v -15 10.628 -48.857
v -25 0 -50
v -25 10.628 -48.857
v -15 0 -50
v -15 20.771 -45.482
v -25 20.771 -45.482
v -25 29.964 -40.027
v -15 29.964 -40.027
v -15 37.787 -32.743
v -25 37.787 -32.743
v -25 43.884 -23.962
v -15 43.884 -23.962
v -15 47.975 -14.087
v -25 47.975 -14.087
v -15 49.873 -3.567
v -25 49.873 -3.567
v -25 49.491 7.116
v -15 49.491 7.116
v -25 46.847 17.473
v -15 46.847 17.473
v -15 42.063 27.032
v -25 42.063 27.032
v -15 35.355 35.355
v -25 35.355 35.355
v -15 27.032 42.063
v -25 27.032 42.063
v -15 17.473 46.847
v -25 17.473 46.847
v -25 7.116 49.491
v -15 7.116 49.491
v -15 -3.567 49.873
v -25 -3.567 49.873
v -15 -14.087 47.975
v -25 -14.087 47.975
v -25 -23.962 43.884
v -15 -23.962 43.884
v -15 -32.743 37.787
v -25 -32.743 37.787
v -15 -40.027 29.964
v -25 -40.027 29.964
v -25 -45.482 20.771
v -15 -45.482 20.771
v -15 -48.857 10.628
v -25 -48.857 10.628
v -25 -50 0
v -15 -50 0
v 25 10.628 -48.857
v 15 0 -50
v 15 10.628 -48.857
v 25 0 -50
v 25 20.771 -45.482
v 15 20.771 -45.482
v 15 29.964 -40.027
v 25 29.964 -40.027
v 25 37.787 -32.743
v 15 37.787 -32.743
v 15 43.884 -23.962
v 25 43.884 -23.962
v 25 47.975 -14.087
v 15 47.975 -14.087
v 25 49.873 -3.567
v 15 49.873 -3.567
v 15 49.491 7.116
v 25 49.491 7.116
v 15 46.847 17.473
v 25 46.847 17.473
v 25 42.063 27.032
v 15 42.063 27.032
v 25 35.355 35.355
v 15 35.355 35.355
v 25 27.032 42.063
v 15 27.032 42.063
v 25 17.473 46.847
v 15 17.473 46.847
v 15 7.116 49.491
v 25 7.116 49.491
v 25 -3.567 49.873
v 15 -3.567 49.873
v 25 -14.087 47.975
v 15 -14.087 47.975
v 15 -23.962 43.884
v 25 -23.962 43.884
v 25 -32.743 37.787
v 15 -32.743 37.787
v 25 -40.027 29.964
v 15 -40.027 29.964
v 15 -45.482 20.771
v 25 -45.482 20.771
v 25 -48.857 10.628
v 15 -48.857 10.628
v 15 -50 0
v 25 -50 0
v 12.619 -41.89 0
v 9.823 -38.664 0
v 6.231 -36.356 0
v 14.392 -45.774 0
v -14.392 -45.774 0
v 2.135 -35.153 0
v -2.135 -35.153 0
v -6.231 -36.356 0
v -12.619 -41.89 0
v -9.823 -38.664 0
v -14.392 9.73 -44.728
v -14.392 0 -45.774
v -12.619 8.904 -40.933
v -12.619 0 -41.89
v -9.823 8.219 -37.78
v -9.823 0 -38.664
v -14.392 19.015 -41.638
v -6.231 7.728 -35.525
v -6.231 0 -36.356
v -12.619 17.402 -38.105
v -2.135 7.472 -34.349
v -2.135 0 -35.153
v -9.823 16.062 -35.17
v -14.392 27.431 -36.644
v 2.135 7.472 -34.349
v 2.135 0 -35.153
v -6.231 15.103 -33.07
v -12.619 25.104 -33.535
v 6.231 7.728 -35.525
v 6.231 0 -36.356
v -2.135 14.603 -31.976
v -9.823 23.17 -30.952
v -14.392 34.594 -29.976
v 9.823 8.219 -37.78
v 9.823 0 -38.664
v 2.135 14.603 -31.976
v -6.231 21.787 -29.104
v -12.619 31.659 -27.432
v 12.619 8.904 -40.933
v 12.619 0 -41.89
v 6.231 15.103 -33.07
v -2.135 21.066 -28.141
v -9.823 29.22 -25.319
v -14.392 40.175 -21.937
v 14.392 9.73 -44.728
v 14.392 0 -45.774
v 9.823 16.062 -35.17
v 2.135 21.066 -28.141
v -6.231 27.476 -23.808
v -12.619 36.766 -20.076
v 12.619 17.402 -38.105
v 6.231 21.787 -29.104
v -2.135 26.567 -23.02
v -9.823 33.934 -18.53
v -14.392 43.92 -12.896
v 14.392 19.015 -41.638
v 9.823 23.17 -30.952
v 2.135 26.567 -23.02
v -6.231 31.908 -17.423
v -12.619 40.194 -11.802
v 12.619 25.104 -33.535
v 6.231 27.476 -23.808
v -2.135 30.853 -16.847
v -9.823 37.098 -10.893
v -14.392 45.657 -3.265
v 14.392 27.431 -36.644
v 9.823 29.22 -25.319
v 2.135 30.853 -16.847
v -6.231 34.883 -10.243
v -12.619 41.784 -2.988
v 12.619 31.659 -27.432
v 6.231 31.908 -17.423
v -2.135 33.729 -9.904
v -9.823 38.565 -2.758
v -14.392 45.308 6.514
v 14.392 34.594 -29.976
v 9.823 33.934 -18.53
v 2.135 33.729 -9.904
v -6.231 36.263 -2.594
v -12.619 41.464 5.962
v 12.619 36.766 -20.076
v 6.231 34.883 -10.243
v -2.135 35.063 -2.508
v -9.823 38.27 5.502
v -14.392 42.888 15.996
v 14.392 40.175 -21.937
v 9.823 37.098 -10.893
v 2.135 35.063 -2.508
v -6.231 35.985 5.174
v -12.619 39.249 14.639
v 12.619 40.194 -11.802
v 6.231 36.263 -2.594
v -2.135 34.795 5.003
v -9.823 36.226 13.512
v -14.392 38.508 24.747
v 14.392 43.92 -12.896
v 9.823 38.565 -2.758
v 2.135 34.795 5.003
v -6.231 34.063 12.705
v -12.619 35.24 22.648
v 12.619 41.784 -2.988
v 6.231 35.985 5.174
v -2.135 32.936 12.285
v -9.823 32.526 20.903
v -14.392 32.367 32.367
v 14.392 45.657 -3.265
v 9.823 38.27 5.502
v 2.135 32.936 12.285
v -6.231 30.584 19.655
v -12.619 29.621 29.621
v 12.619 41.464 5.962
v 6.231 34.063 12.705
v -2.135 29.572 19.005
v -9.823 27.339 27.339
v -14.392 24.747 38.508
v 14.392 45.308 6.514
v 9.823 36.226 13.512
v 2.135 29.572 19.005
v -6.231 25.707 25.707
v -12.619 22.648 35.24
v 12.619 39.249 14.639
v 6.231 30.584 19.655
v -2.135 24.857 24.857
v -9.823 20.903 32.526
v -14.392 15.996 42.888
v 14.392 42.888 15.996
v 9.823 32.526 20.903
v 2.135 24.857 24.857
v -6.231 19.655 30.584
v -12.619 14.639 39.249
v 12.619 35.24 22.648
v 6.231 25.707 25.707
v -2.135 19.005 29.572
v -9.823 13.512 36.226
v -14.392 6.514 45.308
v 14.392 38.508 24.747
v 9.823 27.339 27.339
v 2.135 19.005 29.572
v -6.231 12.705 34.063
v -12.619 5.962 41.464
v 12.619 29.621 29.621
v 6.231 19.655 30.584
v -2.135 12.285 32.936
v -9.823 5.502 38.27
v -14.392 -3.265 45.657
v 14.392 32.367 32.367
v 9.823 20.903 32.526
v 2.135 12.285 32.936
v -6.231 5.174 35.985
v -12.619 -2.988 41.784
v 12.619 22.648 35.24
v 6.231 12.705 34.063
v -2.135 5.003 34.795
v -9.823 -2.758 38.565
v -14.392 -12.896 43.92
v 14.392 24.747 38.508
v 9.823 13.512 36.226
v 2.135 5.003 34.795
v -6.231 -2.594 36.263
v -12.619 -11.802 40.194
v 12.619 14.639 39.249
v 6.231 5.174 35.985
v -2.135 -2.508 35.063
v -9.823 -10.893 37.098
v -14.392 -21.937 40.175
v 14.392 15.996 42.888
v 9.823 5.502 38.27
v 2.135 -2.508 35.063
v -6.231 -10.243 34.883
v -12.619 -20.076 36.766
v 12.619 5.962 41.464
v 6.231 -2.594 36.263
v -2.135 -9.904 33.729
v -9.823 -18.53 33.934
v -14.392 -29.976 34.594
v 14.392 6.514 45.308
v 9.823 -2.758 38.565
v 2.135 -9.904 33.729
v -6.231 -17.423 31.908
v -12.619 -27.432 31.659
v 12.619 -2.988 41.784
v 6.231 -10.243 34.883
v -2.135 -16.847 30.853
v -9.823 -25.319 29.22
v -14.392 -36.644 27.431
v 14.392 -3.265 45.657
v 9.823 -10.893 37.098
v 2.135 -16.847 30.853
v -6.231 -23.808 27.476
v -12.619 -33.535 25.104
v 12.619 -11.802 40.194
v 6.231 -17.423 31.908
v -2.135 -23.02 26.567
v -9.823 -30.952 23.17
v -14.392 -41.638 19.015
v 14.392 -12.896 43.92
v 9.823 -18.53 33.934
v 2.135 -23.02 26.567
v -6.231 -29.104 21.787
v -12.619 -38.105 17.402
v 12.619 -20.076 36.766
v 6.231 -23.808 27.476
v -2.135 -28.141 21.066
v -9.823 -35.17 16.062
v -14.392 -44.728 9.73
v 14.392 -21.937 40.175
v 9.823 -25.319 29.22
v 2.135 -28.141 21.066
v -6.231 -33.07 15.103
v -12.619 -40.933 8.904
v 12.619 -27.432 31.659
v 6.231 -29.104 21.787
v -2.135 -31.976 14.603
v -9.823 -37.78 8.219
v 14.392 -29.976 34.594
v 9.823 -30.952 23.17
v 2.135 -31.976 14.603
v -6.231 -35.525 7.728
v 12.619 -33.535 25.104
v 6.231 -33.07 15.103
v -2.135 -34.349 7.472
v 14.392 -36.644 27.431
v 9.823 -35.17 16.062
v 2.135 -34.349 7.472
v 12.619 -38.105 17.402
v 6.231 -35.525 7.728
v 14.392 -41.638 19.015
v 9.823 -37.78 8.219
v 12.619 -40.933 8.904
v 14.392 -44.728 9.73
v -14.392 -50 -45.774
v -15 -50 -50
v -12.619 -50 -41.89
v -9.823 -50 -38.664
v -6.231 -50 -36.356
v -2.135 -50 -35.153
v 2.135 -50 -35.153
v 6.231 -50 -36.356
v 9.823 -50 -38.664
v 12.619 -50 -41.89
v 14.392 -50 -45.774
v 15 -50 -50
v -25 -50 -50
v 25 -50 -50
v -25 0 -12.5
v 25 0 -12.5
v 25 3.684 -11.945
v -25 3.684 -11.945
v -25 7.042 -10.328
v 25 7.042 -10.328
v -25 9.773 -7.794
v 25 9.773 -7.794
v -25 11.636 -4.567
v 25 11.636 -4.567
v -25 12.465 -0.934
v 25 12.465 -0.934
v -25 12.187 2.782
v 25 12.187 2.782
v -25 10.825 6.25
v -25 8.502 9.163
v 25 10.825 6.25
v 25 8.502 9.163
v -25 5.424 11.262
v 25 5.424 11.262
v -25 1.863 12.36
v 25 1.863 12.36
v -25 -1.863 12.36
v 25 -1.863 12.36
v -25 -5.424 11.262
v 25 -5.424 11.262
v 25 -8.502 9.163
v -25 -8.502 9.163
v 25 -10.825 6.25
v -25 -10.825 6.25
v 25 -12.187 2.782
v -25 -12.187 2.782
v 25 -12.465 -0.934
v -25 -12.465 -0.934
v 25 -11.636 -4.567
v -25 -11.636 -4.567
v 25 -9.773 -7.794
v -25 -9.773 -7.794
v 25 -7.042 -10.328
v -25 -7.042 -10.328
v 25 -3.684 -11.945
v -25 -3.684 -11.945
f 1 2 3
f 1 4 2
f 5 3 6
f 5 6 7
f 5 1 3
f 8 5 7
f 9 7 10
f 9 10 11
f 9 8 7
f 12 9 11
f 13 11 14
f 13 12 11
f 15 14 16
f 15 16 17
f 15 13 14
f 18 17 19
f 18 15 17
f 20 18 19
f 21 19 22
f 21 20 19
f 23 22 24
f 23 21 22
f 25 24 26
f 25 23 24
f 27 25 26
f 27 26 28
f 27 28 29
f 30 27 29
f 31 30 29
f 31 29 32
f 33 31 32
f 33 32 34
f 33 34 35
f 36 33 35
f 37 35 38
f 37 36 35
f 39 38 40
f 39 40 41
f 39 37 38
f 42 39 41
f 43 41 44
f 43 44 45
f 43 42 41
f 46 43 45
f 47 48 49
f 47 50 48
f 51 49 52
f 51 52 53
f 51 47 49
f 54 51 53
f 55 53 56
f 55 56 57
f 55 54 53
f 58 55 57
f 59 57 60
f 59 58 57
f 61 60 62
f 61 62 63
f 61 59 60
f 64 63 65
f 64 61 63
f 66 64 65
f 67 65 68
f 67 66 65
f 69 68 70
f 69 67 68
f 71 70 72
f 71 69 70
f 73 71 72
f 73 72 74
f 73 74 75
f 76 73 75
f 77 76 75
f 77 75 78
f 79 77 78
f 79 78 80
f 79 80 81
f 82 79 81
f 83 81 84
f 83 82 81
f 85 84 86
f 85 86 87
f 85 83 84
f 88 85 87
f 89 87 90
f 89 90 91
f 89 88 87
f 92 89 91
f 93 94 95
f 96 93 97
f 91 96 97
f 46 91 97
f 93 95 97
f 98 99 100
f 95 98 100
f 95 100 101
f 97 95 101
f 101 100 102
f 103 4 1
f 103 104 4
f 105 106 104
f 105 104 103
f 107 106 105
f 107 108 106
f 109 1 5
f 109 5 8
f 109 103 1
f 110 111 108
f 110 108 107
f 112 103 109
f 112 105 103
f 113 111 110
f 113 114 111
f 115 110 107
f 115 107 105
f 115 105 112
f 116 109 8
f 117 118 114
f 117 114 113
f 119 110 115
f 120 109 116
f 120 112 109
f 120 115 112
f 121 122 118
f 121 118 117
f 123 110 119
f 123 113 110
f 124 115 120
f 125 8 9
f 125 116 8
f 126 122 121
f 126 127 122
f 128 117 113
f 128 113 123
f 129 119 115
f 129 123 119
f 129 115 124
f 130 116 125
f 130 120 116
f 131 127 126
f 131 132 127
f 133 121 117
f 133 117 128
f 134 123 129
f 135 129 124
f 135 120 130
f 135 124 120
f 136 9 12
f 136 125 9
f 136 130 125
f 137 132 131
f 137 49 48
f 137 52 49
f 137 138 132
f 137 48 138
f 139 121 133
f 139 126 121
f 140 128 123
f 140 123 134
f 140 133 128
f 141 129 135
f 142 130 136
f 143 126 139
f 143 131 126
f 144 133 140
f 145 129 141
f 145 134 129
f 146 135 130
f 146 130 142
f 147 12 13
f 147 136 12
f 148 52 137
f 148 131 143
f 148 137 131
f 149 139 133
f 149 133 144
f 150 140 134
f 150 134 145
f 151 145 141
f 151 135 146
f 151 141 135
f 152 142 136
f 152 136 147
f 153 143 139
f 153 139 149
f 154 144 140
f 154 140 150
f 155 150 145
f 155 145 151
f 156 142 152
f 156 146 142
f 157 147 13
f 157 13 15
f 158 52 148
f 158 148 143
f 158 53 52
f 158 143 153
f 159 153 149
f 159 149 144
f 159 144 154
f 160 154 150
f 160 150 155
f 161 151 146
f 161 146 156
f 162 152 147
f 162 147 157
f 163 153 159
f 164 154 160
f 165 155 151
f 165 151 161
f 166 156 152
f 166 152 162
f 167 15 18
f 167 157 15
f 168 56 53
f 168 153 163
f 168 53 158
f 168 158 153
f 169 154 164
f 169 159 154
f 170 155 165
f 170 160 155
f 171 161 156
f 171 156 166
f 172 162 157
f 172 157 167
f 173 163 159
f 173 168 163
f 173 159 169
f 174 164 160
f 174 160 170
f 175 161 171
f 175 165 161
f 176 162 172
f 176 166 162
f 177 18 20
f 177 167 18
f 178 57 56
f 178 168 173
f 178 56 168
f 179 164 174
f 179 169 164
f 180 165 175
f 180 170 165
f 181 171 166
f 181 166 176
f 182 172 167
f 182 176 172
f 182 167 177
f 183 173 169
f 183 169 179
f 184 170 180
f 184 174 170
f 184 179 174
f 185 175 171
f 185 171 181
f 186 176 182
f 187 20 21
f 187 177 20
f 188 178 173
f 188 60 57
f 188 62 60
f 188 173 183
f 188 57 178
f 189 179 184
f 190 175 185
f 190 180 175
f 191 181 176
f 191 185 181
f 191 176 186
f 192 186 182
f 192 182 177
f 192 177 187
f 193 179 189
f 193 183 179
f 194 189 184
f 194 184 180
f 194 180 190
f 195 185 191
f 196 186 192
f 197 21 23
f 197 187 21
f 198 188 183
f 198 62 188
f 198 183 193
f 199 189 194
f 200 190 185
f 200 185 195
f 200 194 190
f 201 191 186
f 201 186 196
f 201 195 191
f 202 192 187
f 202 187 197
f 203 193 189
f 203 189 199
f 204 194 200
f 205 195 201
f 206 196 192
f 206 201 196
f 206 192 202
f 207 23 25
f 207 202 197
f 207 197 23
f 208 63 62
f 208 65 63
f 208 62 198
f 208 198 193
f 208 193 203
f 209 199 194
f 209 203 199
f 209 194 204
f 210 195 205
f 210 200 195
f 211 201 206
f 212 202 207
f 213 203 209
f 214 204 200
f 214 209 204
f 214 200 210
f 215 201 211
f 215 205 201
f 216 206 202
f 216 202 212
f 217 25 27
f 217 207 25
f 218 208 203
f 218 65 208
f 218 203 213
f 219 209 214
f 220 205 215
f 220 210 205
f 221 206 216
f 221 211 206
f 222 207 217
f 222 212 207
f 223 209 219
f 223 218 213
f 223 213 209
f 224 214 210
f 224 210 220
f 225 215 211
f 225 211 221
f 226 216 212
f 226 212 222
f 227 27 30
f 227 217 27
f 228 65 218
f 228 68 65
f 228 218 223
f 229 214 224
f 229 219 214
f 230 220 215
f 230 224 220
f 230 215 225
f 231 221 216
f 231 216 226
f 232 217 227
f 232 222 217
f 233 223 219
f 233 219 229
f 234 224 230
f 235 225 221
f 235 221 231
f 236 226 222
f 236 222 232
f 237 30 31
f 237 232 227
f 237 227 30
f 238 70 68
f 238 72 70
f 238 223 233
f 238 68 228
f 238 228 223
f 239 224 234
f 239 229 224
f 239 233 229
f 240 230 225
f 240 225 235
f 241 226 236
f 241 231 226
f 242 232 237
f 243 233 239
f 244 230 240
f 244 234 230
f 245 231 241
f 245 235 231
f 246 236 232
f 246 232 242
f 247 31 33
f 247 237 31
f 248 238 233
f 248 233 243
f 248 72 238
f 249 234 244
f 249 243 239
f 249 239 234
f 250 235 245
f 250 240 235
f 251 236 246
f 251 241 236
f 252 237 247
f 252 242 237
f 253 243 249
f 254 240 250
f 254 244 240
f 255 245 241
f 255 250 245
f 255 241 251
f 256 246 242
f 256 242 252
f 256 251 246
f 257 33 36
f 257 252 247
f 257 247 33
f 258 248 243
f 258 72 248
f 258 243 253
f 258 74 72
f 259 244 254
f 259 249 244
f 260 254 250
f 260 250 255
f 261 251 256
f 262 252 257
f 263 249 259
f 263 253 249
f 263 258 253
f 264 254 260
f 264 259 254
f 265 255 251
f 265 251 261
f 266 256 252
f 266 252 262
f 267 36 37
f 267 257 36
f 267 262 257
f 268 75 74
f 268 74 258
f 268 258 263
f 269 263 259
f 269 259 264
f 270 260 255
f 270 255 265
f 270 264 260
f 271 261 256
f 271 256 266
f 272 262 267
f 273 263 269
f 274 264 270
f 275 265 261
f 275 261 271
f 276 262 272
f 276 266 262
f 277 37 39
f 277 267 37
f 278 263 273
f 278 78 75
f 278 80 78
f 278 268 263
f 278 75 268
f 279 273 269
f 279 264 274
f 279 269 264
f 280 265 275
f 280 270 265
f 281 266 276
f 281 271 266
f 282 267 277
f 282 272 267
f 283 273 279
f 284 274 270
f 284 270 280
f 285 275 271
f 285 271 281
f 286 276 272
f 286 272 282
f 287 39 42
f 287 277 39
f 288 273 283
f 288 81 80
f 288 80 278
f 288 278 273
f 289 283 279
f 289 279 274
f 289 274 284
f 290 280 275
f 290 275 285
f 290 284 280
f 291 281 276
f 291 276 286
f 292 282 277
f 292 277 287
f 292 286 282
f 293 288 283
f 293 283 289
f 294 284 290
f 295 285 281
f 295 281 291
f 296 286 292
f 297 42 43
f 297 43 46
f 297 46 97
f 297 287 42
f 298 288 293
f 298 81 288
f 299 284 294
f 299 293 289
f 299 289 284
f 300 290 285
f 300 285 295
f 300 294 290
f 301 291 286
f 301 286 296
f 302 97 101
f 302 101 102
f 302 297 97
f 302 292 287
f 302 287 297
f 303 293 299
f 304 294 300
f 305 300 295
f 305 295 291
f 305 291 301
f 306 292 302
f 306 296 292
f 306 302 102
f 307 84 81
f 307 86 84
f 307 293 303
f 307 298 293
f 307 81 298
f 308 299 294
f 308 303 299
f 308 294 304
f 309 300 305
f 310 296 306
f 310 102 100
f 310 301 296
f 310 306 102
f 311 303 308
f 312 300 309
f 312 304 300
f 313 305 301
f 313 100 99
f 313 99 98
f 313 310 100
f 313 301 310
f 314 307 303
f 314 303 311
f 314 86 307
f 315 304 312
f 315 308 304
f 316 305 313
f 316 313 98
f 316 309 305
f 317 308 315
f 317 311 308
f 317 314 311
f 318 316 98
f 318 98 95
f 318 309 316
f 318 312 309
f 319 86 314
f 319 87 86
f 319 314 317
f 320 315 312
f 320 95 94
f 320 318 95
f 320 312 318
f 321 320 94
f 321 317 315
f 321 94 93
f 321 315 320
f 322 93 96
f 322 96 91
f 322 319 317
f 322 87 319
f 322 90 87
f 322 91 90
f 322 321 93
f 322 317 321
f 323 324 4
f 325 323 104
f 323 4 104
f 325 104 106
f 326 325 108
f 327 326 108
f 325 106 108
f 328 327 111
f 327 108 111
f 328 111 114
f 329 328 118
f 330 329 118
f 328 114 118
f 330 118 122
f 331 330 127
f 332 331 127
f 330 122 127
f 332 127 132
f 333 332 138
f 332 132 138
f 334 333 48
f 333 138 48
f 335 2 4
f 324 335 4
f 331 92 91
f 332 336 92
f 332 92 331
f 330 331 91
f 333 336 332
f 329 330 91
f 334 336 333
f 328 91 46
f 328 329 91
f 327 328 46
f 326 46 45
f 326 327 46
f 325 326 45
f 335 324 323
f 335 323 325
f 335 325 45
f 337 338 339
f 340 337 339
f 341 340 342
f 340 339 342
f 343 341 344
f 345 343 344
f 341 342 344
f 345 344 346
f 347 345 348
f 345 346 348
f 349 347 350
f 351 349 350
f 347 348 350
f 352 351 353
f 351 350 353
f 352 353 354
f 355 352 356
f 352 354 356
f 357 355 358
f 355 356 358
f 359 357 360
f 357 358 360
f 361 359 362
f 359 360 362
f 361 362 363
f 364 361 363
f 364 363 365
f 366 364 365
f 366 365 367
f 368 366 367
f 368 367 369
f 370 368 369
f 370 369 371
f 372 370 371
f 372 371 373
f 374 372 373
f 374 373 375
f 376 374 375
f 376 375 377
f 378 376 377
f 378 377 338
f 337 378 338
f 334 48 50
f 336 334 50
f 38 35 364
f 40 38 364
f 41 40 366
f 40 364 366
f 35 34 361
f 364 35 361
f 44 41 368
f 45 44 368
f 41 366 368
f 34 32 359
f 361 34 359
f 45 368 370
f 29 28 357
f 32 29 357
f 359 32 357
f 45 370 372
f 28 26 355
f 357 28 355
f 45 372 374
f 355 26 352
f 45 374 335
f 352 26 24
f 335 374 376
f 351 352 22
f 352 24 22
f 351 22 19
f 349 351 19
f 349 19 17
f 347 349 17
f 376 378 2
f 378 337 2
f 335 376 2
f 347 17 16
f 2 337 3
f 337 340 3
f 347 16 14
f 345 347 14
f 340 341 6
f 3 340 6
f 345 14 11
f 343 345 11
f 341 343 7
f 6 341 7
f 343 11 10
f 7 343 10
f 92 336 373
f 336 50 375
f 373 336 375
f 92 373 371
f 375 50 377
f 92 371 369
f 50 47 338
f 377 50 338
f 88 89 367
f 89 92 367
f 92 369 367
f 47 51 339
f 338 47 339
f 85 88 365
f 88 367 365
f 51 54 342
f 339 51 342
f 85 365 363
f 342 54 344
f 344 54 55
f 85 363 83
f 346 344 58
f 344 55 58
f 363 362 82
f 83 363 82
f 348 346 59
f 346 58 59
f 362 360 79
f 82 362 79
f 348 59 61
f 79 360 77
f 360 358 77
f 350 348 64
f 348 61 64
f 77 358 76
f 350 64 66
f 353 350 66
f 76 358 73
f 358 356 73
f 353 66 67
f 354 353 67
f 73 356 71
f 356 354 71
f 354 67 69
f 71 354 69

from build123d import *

# Parameters (mm, degrees)
REVOLVE1_ANGLE      = 270
BOSS_EXTRUDE1_DEPTH = 50
SKETCH3_R           = 12.5
CUT_EXTRUDE2_DEPTH  = 51


with BuildPart() as part:
    # Sketch1 → Revolve1 (revolve)
    with BuildSketch(Plane(origin=(0, 0, 0), x_dir=(1, 0, 0), z_dir=(0, 1, 0))):
        with BuildLine():
            Line((15, 50), (25, 50))
            Line((25, 50), (25, 0))
            Line((25, 0), (-25, 0))
            Line((-25, 0), (-25, 50))
            Line((-25, 50), (-15, 50))
            ThreePointArc((-15, 50), (0, 35), (15, 50))
        make_face()
    revolve(axis=Axis((-25, 0, 0), (1, 0, 0)), revolution_arc=REVOLVE1_ANGLE)

    # Sketch1<2> → Boss-Extrude1 (add)
    with BuildSketch(Plane(origin=(0, 0, 0), x_dir=(1, 0, 0), z_dir=(0, 1, 0))):
        with BuildLine():
            Line((15, 50), (25, 50))
            Line((25, 50), (25, 0))
            Line((25, 0), (-25, 0))
            Line((-25, 0), (-25, 50))
            Line((-25, 50), (-15, 50))
            ThreePointArc((-15, 50), (0, 35), (15, 50))
        make_face()
    extrude(amount=-BOSS_EXTRUDE1_DEPTH)

    # Sketch3 → Cut-Extrude2 (cut, through all)
    with BuildSketch(Plane(origin=(25, 0, 0), x_dir=(0, 0, -1), z_dir=(1, 0, 0))):
        Circle(SKETCH3_R)
    extrude(amount=-CUT_EXTRUDE2_DEPTH, mode=Mode.SUBTRACT)


solid = part.part
